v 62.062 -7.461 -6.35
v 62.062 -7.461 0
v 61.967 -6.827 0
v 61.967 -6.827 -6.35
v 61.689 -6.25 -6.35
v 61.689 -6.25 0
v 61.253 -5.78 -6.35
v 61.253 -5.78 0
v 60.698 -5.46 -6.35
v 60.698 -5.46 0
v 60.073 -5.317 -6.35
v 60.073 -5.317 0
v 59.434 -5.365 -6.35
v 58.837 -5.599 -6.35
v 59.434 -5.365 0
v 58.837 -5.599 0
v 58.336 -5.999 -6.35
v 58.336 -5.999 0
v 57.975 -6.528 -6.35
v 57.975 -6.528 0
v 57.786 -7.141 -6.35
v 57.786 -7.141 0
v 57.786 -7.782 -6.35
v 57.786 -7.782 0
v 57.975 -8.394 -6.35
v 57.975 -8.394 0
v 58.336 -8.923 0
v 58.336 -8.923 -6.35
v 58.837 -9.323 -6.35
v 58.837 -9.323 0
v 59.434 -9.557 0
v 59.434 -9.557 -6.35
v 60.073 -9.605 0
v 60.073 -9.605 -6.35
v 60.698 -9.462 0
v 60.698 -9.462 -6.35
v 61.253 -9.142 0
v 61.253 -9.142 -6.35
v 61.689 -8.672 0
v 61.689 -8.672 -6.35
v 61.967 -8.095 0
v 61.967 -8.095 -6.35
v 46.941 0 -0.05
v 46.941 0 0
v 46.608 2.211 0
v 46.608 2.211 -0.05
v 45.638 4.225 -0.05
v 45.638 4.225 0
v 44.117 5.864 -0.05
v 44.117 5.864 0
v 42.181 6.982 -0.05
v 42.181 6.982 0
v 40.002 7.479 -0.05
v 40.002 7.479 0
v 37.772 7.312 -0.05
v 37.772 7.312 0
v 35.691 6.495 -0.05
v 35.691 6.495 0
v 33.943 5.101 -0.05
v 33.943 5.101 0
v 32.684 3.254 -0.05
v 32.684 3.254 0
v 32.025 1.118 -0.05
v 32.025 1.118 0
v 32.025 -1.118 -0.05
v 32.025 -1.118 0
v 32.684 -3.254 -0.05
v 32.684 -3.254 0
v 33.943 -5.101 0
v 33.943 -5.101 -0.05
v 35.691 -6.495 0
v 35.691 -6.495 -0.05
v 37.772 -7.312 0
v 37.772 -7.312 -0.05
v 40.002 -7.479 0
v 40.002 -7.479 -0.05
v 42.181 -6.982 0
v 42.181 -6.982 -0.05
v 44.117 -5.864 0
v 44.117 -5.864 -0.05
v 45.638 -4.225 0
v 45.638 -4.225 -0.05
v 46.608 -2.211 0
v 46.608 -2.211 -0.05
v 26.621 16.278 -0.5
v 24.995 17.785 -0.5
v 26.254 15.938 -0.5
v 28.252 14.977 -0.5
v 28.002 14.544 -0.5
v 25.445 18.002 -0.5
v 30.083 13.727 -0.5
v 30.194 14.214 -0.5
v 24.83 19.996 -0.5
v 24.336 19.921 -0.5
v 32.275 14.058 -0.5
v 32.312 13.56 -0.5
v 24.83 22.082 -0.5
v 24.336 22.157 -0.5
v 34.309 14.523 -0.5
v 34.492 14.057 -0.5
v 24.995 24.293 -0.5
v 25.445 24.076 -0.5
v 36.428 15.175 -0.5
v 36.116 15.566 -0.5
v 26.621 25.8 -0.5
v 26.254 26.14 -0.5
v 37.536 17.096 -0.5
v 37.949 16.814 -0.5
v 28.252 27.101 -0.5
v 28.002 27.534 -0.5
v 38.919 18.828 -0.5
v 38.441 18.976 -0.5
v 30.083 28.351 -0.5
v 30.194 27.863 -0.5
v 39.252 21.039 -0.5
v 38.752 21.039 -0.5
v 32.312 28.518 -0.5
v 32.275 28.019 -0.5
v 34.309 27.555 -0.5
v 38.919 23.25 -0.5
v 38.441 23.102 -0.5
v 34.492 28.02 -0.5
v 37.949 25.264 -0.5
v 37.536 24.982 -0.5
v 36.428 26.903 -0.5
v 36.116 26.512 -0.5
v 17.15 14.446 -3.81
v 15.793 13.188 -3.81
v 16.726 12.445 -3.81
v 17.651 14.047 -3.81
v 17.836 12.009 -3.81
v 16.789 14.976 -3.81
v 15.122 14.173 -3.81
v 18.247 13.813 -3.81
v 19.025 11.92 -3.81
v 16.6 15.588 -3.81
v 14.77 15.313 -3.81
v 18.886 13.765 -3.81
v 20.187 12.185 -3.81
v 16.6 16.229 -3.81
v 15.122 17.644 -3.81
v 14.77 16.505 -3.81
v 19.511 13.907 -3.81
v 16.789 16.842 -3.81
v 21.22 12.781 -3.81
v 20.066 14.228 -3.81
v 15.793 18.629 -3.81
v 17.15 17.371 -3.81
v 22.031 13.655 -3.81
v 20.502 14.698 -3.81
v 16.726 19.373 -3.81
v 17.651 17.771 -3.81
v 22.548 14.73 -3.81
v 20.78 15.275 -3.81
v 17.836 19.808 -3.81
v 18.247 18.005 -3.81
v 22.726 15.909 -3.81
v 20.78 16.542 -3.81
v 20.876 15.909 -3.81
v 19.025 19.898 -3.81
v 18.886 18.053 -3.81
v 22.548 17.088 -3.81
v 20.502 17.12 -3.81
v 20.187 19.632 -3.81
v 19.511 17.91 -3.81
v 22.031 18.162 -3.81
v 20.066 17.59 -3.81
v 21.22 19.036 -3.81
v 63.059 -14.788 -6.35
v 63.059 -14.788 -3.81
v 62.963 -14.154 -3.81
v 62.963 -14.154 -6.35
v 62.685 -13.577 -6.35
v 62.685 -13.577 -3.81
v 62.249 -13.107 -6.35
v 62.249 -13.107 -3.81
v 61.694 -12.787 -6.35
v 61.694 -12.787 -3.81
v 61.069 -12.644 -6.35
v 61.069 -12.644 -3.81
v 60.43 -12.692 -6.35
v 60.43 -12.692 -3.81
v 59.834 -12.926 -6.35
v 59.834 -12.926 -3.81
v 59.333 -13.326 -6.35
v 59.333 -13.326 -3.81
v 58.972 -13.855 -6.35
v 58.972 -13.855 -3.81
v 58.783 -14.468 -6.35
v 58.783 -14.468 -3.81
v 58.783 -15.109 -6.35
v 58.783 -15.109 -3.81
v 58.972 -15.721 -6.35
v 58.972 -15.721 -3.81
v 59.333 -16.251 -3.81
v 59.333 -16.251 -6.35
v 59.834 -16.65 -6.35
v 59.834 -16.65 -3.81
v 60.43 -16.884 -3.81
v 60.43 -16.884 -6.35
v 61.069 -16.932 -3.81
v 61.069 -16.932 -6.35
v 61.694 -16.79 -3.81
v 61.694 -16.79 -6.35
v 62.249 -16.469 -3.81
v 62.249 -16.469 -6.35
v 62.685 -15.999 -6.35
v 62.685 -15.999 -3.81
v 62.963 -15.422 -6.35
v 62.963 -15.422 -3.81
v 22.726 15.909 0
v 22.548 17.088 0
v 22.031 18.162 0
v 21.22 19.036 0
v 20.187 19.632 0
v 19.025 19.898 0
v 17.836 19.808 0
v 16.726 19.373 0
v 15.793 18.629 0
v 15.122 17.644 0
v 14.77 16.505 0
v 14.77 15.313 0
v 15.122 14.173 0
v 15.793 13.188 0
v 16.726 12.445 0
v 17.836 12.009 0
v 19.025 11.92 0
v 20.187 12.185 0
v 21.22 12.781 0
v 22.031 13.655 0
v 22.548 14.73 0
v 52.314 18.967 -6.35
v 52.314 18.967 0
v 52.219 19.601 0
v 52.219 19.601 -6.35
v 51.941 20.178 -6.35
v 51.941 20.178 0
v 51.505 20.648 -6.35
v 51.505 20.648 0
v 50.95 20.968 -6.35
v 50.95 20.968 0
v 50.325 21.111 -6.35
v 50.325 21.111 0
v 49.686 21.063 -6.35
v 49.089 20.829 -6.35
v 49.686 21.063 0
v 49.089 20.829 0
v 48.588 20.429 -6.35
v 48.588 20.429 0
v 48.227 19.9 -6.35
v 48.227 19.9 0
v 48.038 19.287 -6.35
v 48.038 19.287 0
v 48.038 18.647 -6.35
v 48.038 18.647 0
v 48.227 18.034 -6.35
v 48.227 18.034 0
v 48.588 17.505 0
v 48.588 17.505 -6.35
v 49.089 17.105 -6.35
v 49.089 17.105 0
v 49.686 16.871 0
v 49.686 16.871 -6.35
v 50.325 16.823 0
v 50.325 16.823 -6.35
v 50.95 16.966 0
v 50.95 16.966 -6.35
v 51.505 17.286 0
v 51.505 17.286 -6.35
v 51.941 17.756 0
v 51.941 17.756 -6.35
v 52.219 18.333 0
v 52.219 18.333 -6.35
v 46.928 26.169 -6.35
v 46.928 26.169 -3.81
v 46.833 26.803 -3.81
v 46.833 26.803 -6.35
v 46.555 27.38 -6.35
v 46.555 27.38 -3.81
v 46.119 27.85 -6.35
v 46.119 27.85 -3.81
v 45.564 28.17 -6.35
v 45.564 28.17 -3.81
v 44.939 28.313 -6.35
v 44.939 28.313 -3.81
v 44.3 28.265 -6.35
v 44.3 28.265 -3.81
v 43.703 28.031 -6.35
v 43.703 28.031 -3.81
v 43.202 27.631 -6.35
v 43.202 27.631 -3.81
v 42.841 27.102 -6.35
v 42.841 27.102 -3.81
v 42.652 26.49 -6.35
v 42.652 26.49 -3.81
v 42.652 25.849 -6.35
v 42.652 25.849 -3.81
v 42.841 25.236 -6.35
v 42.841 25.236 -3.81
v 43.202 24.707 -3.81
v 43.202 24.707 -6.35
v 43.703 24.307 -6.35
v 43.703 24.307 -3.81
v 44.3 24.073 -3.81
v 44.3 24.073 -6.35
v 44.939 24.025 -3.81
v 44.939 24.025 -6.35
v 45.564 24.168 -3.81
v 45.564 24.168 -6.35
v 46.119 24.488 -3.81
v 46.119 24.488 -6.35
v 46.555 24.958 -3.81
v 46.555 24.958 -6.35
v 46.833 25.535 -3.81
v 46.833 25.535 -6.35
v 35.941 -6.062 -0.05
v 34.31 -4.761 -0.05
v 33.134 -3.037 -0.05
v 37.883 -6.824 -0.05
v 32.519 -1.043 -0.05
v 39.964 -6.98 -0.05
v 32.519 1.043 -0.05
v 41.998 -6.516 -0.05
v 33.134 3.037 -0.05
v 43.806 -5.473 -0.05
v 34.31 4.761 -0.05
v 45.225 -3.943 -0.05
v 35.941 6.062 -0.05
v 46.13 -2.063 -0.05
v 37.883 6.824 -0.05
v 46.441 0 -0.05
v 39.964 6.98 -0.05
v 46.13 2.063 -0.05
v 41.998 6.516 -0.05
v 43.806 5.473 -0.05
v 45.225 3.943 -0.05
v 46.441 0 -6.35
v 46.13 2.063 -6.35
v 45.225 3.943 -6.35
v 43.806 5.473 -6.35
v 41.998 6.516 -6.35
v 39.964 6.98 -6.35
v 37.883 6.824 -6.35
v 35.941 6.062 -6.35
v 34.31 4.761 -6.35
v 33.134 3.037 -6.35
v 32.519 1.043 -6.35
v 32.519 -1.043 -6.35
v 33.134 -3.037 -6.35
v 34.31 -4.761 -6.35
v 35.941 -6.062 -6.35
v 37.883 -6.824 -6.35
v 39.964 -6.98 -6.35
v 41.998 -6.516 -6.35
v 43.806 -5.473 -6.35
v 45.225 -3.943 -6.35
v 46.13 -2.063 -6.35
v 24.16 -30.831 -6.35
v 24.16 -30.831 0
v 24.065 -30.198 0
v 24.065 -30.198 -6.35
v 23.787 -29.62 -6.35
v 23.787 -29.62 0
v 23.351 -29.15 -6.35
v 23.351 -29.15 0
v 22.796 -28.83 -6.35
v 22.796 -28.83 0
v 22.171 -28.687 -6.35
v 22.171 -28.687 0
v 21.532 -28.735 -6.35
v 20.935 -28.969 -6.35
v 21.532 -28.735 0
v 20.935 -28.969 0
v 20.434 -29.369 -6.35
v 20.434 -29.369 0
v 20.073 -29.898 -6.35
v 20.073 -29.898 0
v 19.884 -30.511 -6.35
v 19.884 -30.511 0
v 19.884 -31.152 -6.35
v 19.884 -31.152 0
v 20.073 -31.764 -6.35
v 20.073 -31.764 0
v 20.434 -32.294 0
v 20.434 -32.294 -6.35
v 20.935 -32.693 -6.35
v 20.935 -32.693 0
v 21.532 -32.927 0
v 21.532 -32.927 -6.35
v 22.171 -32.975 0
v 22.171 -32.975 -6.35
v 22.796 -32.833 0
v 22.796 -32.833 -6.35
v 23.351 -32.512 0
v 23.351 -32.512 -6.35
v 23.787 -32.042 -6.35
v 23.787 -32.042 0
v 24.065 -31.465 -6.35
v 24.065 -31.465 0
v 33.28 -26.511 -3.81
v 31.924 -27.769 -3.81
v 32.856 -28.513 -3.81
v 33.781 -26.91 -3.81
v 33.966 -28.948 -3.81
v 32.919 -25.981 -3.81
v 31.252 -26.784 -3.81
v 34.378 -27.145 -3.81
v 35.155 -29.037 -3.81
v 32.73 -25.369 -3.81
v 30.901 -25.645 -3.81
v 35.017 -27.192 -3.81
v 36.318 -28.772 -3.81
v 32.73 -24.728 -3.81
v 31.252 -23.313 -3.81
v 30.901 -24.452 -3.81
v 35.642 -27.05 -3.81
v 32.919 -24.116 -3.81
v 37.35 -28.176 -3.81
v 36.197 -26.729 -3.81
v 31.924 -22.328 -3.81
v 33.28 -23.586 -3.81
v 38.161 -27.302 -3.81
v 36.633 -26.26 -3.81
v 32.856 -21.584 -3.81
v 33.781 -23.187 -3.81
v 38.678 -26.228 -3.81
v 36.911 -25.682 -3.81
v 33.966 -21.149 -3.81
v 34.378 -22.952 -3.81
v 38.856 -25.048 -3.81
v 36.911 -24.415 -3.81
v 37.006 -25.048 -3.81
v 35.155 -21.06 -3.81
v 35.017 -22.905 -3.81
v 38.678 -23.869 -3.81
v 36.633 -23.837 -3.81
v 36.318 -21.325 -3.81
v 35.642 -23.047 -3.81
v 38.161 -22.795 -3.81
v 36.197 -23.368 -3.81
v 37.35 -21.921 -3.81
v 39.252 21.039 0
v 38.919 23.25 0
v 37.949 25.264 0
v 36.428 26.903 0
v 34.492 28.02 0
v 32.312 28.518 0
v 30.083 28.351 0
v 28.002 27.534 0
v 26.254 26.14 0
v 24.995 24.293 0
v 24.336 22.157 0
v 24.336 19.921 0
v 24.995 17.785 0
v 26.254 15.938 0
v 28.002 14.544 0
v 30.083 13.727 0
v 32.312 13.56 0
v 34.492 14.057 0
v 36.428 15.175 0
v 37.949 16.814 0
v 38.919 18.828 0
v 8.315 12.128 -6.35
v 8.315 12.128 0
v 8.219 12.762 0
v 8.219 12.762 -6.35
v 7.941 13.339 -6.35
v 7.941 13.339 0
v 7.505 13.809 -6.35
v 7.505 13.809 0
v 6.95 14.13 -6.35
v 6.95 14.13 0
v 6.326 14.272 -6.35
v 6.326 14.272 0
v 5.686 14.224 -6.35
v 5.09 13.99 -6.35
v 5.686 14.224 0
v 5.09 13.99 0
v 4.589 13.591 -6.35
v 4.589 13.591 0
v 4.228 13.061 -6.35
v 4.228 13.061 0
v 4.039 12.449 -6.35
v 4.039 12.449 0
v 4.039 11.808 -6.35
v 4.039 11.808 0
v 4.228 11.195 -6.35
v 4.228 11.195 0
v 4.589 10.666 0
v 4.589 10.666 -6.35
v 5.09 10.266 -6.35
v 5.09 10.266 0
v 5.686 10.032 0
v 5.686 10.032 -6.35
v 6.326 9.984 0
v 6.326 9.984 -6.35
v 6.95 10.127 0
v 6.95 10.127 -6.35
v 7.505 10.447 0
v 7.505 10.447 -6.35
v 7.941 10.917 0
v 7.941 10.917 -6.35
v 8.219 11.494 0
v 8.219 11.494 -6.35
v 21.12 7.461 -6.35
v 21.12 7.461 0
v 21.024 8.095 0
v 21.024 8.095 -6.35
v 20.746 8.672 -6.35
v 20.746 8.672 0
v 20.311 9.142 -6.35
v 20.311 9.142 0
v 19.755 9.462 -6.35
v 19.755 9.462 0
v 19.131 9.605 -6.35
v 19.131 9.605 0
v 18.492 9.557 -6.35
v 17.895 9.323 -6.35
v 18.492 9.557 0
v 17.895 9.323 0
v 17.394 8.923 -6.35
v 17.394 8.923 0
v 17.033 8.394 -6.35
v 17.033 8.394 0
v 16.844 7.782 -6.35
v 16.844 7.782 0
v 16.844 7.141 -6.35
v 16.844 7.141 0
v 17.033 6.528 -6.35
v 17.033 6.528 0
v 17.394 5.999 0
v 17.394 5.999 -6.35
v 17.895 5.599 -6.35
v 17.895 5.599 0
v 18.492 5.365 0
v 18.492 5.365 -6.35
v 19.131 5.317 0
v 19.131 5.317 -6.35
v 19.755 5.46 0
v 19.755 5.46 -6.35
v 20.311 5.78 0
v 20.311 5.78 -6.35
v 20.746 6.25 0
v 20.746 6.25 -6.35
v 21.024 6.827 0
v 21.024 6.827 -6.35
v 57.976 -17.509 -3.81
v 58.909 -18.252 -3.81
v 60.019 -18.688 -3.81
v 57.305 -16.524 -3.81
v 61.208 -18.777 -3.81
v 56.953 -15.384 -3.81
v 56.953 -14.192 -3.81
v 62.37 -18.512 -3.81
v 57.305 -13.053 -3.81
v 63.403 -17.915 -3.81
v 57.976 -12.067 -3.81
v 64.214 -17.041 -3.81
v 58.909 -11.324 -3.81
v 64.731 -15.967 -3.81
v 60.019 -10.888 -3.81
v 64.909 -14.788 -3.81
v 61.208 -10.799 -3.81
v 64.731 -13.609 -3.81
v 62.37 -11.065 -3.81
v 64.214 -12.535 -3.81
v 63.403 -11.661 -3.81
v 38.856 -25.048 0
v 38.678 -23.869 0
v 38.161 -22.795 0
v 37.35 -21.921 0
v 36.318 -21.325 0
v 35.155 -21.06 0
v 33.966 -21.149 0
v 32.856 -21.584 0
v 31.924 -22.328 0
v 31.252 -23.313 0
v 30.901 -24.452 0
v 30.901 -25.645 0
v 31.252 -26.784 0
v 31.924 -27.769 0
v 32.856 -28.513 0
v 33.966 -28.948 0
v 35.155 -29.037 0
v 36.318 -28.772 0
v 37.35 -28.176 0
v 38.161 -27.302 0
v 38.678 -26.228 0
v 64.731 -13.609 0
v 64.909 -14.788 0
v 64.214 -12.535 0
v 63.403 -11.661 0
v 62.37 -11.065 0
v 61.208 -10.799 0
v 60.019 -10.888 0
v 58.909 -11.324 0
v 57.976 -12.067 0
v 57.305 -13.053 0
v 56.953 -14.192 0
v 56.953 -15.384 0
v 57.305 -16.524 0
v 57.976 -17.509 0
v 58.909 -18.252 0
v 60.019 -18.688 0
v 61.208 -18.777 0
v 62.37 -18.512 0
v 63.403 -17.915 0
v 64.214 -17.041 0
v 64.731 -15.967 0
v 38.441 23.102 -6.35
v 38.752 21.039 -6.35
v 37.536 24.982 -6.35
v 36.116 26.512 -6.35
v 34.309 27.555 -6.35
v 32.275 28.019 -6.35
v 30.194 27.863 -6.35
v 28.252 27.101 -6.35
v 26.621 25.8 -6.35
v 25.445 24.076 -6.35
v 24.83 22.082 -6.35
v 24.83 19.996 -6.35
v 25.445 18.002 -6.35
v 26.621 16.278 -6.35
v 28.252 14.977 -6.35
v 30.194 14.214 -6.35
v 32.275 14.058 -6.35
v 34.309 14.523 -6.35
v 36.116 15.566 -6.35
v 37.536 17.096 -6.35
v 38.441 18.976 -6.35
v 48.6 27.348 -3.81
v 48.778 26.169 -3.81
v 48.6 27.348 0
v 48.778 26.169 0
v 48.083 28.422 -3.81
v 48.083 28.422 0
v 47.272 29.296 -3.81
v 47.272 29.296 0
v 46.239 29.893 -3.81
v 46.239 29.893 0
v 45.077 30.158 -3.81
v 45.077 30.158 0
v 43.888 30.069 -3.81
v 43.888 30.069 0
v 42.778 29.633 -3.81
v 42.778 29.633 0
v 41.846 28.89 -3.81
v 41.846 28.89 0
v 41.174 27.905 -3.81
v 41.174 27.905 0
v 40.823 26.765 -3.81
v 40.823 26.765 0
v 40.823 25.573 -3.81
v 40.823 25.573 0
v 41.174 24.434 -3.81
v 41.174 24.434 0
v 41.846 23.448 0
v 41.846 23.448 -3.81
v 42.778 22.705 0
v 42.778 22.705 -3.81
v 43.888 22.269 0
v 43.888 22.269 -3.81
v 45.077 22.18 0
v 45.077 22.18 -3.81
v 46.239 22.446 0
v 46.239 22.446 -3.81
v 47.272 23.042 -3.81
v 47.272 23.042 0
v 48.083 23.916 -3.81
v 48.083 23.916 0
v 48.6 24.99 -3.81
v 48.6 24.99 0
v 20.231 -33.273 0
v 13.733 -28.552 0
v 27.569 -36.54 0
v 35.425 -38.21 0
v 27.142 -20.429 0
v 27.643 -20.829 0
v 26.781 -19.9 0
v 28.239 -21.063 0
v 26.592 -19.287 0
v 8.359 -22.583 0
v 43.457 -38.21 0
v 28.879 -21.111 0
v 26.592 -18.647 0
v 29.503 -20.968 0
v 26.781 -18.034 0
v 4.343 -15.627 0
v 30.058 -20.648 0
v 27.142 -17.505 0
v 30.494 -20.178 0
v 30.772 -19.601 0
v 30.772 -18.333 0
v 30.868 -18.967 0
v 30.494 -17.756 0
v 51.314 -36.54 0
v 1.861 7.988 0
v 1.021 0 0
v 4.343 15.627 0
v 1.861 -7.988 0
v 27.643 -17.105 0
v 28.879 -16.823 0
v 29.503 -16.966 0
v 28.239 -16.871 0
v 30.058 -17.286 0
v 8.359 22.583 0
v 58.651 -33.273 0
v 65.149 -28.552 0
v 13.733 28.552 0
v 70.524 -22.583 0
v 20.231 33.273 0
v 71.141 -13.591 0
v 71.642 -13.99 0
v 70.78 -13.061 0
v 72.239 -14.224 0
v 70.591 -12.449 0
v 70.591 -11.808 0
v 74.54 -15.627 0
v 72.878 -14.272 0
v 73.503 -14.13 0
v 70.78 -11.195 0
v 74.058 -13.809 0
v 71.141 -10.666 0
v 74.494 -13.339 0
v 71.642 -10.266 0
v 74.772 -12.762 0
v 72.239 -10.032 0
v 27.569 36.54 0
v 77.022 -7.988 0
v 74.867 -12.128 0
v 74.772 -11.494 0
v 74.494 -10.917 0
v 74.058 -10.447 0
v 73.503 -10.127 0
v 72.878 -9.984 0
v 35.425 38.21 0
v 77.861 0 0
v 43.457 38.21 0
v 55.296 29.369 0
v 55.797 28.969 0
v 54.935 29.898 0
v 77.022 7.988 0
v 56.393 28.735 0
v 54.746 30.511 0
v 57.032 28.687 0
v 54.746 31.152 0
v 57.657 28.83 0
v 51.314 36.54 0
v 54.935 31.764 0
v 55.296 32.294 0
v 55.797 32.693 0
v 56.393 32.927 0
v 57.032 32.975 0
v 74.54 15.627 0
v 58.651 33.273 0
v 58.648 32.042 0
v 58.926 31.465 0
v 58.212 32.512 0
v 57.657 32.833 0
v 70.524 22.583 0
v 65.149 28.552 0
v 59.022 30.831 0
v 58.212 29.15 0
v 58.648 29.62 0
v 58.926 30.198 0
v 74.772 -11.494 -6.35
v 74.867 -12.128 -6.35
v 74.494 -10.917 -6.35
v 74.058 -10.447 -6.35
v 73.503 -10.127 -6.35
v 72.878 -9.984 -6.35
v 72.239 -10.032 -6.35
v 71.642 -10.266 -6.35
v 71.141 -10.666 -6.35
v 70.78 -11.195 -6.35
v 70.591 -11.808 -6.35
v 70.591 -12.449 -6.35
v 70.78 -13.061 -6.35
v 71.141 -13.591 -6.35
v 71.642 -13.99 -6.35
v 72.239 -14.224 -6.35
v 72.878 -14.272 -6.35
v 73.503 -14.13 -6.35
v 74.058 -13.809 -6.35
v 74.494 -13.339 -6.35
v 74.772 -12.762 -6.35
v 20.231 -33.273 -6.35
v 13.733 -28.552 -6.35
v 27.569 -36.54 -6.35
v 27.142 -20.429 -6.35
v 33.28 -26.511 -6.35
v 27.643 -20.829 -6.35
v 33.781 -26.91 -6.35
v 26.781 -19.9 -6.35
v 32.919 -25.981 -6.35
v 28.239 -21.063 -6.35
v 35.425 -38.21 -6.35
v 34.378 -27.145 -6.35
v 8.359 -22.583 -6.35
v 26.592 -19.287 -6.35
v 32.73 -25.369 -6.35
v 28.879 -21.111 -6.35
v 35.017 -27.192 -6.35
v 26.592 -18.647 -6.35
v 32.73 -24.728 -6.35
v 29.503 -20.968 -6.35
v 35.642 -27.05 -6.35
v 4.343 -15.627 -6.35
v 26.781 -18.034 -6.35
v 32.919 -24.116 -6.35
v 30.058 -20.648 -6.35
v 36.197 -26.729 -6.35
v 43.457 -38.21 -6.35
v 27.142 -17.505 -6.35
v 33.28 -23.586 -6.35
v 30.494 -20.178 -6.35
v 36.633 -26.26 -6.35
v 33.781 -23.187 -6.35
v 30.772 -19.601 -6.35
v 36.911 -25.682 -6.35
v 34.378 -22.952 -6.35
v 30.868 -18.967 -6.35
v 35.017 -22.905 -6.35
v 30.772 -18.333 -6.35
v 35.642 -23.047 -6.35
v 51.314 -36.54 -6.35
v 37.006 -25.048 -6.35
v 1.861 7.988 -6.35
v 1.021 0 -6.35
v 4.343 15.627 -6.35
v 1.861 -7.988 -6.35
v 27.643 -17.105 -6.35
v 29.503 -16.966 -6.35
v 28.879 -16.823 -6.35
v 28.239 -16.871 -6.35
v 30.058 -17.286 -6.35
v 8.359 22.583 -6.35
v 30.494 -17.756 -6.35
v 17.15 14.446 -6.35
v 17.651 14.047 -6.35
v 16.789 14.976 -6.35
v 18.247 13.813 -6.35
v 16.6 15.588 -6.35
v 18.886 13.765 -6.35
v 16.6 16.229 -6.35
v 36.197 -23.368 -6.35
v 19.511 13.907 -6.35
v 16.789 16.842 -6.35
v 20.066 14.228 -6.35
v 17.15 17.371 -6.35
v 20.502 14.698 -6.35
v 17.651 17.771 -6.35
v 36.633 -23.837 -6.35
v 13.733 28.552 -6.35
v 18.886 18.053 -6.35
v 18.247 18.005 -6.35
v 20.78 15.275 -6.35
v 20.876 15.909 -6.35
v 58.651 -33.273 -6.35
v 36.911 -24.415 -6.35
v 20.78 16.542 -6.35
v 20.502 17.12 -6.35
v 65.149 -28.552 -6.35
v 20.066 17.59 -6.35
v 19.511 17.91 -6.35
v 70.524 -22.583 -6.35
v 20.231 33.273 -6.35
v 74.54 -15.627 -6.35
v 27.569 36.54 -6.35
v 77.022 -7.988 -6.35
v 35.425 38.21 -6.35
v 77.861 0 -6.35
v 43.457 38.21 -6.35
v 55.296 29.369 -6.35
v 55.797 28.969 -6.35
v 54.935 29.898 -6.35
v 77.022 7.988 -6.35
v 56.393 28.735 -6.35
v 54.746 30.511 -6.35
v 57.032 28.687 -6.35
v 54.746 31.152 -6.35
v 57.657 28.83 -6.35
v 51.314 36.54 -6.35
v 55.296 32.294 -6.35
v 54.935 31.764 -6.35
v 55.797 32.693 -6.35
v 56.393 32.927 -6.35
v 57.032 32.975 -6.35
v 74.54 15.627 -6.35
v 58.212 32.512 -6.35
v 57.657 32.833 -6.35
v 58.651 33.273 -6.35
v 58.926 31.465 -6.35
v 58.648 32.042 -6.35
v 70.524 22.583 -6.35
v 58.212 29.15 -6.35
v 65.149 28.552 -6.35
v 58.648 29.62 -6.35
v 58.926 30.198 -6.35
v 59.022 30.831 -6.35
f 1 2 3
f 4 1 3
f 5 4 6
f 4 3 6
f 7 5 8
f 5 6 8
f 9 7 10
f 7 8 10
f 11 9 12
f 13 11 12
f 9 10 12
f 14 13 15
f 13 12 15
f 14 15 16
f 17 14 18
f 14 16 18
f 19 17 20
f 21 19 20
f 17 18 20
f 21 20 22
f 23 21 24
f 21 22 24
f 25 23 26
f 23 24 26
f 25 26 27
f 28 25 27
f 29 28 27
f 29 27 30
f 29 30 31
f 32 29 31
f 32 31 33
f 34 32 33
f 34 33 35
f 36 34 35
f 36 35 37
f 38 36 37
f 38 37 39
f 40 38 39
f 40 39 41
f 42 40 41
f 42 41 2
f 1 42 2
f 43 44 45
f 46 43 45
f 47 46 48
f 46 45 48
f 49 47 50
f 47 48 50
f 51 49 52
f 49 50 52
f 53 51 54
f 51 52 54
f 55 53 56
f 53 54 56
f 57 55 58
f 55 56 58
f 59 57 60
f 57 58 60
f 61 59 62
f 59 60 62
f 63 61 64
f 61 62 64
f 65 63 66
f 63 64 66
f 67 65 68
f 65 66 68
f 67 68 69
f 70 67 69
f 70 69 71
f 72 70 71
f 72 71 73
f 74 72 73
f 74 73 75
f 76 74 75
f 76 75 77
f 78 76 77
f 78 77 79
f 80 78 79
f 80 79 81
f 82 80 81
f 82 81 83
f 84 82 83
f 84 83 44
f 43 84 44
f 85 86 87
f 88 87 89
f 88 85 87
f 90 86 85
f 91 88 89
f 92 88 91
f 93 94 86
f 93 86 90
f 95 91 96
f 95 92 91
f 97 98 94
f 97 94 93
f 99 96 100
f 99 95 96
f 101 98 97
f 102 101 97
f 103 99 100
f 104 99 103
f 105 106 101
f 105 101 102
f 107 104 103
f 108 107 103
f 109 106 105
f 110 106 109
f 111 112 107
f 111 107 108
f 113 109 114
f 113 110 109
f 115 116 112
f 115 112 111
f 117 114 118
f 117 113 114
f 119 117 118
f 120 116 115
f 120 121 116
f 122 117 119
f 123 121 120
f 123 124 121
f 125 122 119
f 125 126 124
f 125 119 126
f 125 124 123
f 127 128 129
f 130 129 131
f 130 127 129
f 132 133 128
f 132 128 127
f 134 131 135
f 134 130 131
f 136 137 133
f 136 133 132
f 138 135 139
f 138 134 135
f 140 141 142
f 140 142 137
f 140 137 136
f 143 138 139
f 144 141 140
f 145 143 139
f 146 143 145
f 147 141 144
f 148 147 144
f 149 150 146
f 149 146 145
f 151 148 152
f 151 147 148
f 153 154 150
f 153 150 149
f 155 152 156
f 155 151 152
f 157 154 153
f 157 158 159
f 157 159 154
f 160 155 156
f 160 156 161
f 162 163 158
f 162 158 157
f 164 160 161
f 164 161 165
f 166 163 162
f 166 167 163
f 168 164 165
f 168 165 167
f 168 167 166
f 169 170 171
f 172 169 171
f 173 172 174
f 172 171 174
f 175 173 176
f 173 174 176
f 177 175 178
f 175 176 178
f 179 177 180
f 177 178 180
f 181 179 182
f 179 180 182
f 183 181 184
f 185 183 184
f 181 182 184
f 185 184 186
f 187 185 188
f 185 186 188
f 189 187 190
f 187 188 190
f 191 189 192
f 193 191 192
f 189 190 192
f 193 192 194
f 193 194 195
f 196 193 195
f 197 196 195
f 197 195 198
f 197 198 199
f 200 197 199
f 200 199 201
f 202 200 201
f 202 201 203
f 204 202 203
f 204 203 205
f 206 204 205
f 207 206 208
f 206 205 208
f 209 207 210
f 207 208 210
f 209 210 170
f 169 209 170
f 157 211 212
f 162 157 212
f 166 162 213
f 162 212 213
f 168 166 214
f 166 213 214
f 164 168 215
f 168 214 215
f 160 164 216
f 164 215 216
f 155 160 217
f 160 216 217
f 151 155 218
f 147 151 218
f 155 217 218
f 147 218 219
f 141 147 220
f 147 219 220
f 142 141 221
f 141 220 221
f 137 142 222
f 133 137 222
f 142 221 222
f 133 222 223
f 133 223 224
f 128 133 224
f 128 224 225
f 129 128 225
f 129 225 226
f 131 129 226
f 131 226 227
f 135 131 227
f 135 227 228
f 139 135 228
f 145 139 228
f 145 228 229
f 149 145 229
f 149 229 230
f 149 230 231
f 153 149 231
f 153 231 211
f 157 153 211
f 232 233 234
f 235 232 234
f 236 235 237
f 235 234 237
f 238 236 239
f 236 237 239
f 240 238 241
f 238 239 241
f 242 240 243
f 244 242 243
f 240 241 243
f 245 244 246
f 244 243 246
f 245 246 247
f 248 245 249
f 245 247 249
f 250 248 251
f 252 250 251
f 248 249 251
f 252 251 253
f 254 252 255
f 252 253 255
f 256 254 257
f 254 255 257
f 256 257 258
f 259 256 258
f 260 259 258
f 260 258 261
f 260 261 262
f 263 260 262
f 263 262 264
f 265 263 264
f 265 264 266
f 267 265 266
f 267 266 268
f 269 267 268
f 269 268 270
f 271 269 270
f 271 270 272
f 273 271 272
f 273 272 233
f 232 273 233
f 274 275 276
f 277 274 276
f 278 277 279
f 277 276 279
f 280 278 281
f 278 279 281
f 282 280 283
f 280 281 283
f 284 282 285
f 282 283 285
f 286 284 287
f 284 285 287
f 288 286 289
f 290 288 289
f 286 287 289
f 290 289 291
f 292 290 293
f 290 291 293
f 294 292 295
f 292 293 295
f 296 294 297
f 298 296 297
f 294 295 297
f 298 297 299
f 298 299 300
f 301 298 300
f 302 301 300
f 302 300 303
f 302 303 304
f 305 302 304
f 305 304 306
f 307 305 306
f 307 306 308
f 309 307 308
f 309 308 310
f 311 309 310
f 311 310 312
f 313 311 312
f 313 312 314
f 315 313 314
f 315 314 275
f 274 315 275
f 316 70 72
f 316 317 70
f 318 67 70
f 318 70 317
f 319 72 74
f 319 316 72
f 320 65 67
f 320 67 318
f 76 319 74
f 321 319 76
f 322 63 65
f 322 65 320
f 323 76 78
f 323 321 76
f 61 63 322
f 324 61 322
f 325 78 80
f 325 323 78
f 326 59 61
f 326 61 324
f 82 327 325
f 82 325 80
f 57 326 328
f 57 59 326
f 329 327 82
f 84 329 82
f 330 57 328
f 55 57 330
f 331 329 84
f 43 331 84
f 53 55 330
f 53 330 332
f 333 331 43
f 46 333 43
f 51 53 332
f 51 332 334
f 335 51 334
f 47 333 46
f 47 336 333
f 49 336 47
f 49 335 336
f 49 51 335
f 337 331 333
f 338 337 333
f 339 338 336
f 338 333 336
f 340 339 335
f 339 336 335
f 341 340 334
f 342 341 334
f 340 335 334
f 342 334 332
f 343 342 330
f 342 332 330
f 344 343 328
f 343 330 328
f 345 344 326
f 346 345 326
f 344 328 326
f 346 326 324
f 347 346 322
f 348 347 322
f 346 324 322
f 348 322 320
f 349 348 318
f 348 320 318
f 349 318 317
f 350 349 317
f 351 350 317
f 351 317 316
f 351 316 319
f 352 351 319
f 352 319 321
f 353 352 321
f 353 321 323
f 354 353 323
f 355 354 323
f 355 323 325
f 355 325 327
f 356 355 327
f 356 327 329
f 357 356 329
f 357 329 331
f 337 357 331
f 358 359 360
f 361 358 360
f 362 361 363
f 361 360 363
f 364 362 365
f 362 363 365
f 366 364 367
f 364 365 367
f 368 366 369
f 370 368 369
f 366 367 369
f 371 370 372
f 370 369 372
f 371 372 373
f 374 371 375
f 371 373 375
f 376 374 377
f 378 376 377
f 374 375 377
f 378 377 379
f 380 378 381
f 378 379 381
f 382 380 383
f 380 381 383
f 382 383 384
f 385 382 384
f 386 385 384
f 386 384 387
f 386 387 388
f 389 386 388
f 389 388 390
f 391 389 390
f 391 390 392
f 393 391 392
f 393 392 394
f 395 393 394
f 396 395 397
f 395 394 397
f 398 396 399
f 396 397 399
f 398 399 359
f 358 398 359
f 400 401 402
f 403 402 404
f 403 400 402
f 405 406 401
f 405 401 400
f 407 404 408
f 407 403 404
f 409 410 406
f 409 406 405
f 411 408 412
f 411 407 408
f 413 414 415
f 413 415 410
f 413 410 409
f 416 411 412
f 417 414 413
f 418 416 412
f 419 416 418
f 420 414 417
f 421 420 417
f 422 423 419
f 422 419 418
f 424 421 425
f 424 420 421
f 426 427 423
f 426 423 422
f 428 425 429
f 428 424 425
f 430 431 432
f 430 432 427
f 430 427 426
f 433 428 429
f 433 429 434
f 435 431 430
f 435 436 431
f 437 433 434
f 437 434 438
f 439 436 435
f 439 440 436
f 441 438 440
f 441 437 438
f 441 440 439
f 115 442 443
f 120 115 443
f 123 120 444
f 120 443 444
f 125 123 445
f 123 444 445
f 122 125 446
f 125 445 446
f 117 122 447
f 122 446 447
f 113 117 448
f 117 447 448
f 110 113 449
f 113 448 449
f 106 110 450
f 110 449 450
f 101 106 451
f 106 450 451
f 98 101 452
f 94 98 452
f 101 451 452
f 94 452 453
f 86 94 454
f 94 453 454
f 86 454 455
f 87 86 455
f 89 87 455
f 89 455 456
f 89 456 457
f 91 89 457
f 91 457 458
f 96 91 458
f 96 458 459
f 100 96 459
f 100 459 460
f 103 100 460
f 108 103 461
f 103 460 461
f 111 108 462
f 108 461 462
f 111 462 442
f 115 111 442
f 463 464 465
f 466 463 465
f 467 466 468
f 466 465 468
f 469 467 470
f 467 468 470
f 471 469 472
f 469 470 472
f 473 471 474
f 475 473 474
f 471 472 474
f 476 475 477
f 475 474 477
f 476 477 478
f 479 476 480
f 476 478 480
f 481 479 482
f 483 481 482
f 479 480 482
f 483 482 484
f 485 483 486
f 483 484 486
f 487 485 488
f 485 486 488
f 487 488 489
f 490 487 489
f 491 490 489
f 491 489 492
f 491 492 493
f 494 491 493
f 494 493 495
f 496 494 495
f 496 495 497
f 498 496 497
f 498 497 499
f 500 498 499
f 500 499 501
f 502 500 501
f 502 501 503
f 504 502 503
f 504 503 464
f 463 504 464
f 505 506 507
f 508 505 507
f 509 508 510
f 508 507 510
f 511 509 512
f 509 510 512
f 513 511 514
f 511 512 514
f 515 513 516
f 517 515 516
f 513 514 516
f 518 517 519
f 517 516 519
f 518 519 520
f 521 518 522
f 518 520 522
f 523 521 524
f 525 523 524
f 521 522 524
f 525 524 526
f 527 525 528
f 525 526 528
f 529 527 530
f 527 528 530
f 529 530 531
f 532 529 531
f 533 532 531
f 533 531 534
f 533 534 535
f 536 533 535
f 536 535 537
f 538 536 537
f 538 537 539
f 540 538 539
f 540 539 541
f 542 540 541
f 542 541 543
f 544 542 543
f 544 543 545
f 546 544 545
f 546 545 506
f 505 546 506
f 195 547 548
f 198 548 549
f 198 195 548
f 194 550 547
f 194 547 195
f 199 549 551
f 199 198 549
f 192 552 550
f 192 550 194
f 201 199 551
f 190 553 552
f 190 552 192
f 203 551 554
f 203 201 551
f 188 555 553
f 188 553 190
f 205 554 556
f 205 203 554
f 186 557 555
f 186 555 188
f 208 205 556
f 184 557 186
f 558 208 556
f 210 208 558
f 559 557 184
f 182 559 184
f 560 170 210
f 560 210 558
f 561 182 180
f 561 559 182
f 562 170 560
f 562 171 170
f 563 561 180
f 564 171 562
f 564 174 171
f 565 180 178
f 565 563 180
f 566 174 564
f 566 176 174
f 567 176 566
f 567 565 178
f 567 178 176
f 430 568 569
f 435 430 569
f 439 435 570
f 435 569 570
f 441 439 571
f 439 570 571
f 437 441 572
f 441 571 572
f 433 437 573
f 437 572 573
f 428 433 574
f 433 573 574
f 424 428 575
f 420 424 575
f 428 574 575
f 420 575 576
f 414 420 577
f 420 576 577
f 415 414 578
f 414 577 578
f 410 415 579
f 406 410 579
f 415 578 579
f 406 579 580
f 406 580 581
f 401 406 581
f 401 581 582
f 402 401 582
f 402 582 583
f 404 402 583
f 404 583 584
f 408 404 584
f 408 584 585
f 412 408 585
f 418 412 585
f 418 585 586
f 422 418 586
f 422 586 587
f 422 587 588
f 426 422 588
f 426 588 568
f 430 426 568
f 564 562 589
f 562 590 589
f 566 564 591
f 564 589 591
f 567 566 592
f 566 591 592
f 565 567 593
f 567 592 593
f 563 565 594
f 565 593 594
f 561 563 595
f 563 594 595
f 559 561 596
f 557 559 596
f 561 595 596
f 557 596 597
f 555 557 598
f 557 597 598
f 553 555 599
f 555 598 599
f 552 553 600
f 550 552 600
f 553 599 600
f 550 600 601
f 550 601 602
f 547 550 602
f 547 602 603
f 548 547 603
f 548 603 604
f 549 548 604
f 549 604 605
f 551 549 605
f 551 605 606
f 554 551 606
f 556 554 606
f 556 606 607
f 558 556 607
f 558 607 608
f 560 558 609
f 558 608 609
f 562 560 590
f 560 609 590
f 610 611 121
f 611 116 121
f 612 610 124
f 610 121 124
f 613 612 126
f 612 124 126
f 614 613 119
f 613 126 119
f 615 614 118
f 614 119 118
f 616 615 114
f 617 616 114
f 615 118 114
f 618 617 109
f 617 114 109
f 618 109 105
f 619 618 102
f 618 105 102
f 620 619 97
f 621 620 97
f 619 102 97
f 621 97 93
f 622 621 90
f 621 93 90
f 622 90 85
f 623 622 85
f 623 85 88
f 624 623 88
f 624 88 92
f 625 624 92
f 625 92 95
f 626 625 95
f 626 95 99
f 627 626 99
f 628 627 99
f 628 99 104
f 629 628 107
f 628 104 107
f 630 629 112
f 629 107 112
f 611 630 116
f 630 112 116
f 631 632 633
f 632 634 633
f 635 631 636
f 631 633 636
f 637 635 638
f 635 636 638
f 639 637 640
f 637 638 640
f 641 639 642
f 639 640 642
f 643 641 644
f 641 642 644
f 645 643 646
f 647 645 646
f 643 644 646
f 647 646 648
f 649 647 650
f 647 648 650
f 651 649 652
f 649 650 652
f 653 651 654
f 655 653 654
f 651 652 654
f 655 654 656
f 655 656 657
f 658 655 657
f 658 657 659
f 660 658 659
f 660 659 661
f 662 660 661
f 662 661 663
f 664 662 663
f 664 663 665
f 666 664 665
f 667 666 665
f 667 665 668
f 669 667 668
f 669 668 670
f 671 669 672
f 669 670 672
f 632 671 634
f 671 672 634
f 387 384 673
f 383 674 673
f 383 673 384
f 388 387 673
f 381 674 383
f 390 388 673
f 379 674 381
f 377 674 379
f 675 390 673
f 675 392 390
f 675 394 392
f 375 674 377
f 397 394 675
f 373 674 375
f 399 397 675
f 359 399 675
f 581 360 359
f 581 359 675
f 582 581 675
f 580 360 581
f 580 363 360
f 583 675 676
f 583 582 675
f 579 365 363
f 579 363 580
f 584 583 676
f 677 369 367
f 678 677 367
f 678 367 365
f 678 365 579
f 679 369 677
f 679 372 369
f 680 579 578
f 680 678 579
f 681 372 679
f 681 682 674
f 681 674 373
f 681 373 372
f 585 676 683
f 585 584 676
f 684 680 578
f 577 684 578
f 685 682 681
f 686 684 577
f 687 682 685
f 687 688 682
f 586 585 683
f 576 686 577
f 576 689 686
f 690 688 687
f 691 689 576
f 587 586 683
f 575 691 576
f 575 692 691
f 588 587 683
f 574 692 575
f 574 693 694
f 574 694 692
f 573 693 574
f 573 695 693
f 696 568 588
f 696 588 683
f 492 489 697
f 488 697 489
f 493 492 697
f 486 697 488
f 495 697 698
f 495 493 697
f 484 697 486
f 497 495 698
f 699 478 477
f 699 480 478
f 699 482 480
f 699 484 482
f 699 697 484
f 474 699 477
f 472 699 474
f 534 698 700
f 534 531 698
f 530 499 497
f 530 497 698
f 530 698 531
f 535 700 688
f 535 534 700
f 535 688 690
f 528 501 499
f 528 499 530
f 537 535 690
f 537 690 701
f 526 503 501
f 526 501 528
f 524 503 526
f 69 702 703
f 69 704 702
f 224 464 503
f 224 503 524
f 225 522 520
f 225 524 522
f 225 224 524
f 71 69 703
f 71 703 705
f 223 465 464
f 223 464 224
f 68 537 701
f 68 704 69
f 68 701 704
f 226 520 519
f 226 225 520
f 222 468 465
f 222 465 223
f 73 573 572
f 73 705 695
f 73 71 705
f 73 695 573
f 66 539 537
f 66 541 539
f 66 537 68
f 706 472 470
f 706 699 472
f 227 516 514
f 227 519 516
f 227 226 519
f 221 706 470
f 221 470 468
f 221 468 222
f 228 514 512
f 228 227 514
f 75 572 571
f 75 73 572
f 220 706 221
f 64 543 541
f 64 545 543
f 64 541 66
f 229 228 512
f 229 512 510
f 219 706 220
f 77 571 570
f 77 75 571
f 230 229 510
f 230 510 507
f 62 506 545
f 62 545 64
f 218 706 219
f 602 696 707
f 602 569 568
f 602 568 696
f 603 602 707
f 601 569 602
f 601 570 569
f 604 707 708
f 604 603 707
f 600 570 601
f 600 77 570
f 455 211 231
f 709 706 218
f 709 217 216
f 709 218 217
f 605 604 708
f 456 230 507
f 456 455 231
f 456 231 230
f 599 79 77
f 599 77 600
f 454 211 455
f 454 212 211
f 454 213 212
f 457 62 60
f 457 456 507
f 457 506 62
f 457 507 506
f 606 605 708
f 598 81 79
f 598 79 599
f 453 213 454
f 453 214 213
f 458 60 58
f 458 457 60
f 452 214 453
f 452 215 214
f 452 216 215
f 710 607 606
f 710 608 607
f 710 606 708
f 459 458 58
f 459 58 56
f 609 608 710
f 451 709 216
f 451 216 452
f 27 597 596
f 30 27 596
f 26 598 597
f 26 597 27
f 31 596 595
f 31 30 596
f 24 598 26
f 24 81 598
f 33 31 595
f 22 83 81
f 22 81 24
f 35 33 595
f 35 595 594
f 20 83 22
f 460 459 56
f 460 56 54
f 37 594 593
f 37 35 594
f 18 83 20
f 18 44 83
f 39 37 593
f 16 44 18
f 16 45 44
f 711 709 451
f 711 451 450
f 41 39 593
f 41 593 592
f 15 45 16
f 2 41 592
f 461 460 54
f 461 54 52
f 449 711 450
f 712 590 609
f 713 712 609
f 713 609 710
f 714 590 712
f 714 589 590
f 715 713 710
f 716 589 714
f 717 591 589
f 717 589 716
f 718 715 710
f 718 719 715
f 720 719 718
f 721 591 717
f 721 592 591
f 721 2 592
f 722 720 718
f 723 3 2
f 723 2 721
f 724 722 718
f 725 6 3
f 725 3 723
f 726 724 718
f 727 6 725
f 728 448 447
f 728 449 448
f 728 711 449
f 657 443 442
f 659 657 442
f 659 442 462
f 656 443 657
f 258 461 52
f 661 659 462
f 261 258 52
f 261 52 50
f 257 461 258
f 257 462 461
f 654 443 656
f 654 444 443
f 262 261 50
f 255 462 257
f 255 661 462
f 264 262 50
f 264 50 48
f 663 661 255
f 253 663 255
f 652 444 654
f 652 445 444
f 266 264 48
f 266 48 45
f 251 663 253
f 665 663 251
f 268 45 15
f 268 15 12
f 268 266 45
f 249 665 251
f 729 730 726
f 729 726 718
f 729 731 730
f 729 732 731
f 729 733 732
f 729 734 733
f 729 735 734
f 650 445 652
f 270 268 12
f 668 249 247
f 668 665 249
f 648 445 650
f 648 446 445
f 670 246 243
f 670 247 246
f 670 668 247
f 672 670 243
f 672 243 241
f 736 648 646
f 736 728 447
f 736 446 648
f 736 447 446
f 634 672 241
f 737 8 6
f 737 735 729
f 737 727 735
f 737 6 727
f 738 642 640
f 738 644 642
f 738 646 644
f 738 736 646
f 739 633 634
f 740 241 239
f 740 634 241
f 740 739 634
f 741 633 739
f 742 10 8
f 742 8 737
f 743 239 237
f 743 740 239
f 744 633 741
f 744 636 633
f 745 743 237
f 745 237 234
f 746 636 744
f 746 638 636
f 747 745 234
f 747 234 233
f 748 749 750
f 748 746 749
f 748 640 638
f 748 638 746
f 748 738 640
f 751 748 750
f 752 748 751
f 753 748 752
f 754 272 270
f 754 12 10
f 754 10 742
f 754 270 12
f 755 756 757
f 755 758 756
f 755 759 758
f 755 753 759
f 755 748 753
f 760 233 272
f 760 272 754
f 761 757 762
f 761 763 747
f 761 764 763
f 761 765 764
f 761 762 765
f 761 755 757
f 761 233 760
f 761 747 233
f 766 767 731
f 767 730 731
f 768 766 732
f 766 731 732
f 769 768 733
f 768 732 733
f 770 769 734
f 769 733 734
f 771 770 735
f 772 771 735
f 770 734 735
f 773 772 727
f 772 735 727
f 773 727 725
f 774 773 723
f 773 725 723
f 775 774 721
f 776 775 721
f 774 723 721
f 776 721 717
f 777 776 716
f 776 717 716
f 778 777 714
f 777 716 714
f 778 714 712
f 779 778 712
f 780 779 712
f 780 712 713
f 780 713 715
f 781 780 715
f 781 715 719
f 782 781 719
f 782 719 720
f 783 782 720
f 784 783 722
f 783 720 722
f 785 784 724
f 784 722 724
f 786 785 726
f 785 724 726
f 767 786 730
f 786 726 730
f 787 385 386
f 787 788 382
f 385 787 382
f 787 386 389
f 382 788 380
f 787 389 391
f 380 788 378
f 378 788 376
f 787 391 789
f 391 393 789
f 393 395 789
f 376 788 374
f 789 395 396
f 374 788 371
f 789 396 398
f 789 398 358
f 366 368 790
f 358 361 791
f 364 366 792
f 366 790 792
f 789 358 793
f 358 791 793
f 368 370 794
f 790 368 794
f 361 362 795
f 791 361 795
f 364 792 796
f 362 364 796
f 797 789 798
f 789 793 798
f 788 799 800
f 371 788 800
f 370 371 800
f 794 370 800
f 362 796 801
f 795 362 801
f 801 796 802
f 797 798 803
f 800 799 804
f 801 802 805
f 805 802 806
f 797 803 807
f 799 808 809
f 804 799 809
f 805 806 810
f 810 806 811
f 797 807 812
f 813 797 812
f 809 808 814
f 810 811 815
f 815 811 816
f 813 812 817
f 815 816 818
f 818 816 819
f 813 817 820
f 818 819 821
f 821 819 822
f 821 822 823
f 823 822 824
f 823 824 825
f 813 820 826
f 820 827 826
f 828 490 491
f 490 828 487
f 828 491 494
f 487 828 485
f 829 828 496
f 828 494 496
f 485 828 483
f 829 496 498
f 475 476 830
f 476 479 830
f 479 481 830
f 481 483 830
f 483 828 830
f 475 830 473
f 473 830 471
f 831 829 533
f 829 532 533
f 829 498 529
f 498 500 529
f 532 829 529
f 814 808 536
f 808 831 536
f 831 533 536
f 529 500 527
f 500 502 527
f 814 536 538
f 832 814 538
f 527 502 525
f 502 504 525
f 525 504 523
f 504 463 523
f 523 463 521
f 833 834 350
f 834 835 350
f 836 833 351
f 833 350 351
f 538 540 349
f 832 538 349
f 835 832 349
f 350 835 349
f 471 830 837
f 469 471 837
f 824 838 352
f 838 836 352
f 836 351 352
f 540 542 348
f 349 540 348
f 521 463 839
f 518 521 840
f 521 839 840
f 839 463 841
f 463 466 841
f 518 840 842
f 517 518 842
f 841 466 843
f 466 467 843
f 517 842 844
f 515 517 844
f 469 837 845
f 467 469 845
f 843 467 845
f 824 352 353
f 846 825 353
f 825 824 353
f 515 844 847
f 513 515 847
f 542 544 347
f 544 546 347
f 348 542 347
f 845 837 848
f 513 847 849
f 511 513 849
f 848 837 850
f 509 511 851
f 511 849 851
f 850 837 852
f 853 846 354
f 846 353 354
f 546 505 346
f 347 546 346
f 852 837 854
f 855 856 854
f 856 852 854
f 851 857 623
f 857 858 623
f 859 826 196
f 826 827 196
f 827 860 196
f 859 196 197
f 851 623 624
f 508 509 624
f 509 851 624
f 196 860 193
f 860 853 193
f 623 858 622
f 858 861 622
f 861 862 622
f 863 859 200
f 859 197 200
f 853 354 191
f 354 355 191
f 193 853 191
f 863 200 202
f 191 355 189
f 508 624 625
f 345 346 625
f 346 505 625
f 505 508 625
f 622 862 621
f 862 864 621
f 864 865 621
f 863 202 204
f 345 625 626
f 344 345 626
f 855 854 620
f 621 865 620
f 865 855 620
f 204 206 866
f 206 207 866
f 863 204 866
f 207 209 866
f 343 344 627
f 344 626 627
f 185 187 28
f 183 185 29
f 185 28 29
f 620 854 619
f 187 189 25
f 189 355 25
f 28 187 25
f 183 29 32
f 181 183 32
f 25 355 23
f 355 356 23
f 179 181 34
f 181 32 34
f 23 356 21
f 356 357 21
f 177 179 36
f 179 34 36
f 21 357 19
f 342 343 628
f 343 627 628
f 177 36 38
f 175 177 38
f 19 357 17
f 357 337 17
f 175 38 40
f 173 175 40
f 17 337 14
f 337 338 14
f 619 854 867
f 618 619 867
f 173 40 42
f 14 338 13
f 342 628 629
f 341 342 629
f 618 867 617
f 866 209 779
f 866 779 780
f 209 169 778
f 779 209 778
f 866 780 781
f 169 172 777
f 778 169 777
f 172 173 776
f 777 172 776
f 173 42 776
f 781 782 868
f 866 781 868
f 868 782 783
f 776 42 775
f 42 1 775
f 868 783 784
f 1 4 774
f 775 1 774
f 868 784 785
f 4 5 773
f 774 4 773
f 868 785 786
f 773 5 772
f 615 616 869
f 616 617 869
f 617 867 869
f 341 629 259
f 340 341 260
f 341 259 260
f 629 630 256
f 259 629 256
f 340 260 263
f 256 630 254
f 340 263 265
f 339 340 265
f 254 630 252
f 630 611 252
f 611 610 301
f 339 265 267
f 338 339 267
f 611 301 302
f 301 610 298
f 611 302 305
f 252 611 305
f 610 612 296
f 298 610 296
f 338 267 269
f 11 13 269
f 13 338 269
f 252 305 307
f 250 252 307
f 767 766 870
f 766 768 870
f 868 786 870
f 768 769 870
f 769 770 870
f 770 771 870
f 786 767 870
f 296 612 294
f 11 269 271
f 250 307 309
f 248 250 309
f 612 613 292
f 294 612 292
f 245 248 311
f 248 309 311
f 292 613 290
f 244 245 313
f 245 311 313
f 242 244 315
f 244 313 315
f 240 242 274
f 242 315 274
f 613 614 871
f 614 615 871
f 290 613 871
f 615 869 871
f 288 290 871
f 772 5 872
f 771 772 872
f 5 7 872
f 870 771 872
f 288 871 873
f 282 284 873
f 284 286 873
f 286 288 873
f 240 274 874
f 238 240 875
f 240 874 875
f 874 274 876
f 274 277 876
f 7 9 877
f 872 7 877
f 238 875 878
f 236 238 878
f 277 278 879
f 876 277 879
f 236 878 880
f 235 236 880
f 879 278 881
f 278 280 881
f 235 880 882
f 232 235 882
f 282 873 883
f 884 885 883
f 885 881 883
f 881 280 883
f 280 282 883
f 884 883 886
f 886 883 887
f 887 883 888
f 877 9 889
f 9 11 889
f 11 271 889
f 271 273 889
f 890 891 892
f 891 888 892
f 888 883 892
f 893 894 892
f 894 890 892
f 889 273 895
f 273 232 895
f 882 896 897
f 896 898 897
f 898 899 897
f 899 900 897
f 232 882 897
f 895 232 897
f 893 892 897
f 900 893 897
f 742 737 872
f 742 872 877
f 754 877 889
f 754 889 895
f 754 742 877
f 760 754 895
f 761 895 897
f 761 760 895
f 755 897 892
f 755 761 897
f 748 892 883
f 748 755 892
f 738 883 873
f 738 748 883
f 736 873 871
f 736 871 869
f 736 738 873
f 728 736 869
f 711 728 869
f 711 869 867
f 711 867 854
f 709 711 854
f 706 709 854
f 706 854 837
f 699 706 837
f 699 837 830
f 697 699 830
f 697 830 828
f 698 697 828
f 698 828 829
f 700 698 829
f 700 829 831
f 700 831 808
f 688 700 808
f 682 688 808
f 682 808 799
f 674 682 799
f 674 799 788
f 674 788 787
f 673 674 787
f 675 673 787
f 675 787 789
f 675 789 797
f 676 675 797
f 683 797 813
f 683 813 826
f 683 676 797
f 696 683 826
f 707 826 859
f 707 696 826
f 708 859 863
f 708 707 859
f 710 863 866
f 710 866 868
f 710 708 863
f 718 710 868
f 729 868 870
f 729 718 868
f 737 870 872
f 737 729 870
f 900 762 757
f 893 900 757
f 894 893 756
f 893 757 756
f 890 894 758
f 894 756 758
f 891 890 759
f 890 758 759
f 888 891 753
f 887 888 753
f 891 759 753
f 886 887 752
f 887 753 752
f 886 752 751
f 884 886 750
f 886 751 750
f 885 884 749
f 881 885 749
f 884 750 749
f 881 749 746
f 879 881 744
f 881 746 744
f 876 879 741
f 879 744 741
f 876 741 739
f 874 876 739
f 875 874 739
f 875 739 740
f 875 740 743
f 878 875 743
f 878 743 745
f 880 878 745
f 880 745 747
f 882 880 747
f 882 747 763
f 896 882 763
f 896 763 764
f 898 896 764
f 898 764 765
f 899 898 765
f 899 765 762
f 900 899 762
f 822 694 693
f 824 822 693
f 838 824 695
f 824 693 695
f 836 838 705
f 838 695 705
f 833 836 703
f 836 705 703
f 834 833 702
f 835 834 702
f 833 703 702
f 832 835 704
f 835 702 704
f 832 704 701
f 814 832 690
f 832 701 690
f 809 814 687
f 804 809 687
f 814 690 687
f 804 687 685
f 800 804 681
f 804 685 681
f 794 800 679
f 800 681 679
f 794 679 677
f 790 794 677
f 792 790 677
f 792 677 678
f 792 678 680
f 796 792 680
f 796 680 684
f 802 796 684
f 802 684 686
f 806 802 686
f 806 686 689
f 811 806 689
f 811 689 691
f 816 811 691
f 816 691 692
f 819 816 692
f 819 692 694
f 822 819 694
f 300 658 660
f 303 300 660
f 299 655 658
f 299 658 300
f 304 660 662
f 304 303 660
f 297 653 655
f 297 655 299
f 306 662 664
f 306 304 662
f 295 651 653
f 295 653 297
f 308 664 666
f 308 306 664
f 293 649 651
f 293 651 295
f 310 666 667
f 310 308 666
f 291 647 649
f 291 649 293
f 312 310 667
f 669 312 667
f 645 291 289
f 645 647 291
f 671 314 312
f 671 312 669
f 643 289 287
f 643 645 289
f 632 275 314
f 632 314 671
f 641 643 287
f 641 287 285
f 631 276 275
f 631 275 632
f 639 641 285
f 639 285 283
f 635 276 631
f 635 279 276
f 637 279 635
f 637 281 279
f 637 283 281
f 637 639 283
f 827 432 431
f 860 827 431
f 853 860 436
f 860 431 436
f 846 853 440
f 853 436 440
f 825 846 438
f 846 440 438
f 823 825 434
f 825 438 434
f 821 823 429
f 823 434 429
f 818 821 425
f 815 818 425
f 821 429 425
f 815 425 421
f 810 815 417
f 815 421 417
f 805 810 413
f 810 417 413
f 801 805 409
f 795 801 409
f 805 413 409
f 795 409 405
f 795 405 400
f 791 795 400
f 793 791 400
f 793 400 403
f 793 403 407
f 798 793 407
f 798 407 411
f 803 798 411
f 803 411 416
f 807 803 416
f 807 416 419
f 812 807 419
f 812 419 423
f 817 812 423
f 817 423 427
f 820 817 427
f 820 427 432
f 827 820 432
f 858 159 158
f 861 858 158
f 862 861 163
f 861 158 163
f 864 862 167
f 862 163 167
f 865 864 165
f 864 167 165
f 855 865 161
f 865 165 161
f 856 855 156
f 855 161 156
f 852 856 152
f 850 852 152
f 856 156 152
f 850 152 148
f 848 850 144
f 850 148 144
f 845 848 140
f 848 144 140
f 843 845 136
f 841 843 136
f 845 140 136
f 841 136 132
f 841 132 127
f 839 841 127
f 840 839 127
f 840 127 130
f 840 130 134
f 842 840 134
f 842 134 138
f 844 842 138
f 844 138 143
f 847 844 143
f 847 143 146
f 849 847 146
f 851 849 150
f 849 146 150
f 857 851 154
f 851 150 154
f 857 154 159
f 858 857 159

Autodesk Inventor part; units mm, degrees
ref_plane "YZ Plane" through (0, 0, 0) normal (1, 0, 0) x (0, 1, 0)
ref_plane "XZ Plane" through (0, 0, 0) normal (0, 1, 0) x (-1, 0, 0)
ref_plane "Work Plane1" through (-28.6125, -68.0536, -6.35) normal (0, 0, -1) x (0, 1, 0)
sketch "Sketch1" plane through (0, 0, 0) normal (0, 0, 1) x (1, 0, 0)
  circle A0 centre (39.4411, 0) radius 38.42
  circle A1 centre (28.7179, -18.967) radius 2.975 construction
  circle A2 centre (18.97, 7.4611) radius 2.975 construction
  circle A3 centre (59.9122, -7.4611) radius 2.975 construction
  circle A4 centre (50.1643, 18.967) radius 2.875 construction
  circle A5 centre (39.4411, 0) radius 7
  circle A6 centre (31.7519, 21.0389) radius 7
  circle A7 centre (59.9122, -7.4611) radius 2.15
  circle A8 centre (50.1643, 18.967) radius 2.15
  circle A9 centre (18.97, 7.4611) radius 2.15
  circle A10 centre (28.7179, -18.967) radius 2.15
  point P0 (0, 0)
extrude "Extrusion1" add sketch "Sketch1" against normal up to surface (6.35 mm away)
ref_plane "Work Plane2" through (39.4411, 0, -4.95) normal (0, 0, -1) x (-0.4776, -0.8786, 0)
sketch "Sketch3" plane through (39.4411, 0, 0) normal (0, 0, 1) x (1, 0, 0)
  circle A0 centre (0, 0) radius 7.5 projected
  circle A1 centre (-7.6892, 21.0389) radius 7 construction
  circle A2 centre (-7.6892, 21.0389) radius 7.5
  point P0 (-39.4411, 0)
  dimension "d10" = 15
extrude "Extrusion3" cut sketch "Sketch3" against normal blind 0.5 contours A2
sketch "Sketch5" plane through (39.4411, 0, 0) normal (0, 0, 1) x (1, 0, 0)
  circle A0 centre (0, 0) radius 7.3 construction
  circle A1 centre (0, 0) radius 7.5
  point P0 (-39.4411, 0)
  dimension "d11" = 15
extrude "Extrusion4" cut sketch "Sketch5" against normal blind 0.05
sketch "Sketch6" plane through (39.4411, 0, 0) normal (0, 0, 1) x (1, 0, 0)
  circle A0 centre (20.4711, -7.4611) radius 2.975 construction
  circle A1 centre (10.7232, 18.967) radius 2.975 construction
  circle A2 centre (-20.4711, 7.4611) radius 2.975 construction
  circle A3 centre (-10.7232, -18.967) radius 2.975 construction
  line L0 (20.4711, -7.4611) -> (-20.4711, 7.4611) construction
  line L1 (-10.7232, -18.967) -> (10.7232, 18.967) construction
  circle A4 centre (17.4307, 30.8313) radius 2.15
  circle A5 centre (-17.4307, -30.8313) radius 2.15
  line L2 (17.4307, 30.8313) -> (-17.4307, -30.8313) construction
  circle A6 centre (0, 0) radius 38.42 construction
  circle A7 centre (33.2762, -12.1282) radius 2.15
  circle A8 centre (-33.2762, 12.1282) radius 2.15
  line L3 (33.2762, -12.1282) -> (-33.2762, 12.1282) construction
  point P0 (-39.4411, 0)
  dimension "d16" = 4.3
  dimension "d17" = 4.3
  dimension "d18" = 35.4175
  dimension "d19" = 35.4175
  dimension "d20" = 0
  dimension "d21" = 4.3
  dimension "d22" = 4.3
  dimension "d23" = 0
  dimension "d24" = 35.4175
  dimension "d25" = 35.4175
  dimension "d26" = 0
extrude "Extrusion5" cut sketch "Sketch6" against normal up to surface (6.35 mm away)
sketch "Sketch7" plane through (39.4411, 0, 0) normal (0, 0, 1) x (1, 0, 0)
  circle A0 centre (5.337, 26.1691) radius 2.15 construction
  circle A1 centre (-20.7154, 15.9087) radius 2.15 construction
  circle A2 centre (5.337, 26.1691) radius 4
  circle A3 centre (-20.7154, 15.9087) radius 4
  circle A4 centre (-4.5849, -25.0485) radius 2.15 construction
  circle A5 centre (21.4675, -14.7881) radius 2.15 construction
  circle A6 centre (21.4675, -14.7881) radius 4
  circle A7 centre (-4.5849, -25.0485) radius 4
  point P0 (-39.4411, 0)
  dimension "d29" = 8
  dimension "d30" = 8
  dimension "d37" = 8
  dimension "d38" = 8
  dimension "d39" = 0
  dimension "d40" = 0
extrude "Extrusion6" cut sketch "Sketch7" against normal blind 3.81
sketch "Sketch8" plane through (44.7781, 26.1691, -3.81) normal (0, 0, 1) x (1, 0, 0)
  circle A0 centre (0, 0) radius 4 construction
  circle A1 centre (-26.0523, -10.2604) radius 4 construction
  circle A2 centre (0, 0) radius 2.15
  circle A3 centre (-26.0523, -10.2604) radius 2.15
  circle A4 centre (-9.9218, -51.2176) radius 2.15 projected
  circle A5 centre (16.1305, -40.9573) radius 2.15 projected
  point P0 (-44.7781, -26.1691)
  dimension "d33" = 4.3
  dimension "d34" = 4.3
extrude "Extrusion7" cut sketch "Sketch8" against normal through all
equation "\"d19\" = d18"
equation "\"d24\" = d18"
equation "\"d25\" = d18"
properties part number "Inner_Pod_Holder"
